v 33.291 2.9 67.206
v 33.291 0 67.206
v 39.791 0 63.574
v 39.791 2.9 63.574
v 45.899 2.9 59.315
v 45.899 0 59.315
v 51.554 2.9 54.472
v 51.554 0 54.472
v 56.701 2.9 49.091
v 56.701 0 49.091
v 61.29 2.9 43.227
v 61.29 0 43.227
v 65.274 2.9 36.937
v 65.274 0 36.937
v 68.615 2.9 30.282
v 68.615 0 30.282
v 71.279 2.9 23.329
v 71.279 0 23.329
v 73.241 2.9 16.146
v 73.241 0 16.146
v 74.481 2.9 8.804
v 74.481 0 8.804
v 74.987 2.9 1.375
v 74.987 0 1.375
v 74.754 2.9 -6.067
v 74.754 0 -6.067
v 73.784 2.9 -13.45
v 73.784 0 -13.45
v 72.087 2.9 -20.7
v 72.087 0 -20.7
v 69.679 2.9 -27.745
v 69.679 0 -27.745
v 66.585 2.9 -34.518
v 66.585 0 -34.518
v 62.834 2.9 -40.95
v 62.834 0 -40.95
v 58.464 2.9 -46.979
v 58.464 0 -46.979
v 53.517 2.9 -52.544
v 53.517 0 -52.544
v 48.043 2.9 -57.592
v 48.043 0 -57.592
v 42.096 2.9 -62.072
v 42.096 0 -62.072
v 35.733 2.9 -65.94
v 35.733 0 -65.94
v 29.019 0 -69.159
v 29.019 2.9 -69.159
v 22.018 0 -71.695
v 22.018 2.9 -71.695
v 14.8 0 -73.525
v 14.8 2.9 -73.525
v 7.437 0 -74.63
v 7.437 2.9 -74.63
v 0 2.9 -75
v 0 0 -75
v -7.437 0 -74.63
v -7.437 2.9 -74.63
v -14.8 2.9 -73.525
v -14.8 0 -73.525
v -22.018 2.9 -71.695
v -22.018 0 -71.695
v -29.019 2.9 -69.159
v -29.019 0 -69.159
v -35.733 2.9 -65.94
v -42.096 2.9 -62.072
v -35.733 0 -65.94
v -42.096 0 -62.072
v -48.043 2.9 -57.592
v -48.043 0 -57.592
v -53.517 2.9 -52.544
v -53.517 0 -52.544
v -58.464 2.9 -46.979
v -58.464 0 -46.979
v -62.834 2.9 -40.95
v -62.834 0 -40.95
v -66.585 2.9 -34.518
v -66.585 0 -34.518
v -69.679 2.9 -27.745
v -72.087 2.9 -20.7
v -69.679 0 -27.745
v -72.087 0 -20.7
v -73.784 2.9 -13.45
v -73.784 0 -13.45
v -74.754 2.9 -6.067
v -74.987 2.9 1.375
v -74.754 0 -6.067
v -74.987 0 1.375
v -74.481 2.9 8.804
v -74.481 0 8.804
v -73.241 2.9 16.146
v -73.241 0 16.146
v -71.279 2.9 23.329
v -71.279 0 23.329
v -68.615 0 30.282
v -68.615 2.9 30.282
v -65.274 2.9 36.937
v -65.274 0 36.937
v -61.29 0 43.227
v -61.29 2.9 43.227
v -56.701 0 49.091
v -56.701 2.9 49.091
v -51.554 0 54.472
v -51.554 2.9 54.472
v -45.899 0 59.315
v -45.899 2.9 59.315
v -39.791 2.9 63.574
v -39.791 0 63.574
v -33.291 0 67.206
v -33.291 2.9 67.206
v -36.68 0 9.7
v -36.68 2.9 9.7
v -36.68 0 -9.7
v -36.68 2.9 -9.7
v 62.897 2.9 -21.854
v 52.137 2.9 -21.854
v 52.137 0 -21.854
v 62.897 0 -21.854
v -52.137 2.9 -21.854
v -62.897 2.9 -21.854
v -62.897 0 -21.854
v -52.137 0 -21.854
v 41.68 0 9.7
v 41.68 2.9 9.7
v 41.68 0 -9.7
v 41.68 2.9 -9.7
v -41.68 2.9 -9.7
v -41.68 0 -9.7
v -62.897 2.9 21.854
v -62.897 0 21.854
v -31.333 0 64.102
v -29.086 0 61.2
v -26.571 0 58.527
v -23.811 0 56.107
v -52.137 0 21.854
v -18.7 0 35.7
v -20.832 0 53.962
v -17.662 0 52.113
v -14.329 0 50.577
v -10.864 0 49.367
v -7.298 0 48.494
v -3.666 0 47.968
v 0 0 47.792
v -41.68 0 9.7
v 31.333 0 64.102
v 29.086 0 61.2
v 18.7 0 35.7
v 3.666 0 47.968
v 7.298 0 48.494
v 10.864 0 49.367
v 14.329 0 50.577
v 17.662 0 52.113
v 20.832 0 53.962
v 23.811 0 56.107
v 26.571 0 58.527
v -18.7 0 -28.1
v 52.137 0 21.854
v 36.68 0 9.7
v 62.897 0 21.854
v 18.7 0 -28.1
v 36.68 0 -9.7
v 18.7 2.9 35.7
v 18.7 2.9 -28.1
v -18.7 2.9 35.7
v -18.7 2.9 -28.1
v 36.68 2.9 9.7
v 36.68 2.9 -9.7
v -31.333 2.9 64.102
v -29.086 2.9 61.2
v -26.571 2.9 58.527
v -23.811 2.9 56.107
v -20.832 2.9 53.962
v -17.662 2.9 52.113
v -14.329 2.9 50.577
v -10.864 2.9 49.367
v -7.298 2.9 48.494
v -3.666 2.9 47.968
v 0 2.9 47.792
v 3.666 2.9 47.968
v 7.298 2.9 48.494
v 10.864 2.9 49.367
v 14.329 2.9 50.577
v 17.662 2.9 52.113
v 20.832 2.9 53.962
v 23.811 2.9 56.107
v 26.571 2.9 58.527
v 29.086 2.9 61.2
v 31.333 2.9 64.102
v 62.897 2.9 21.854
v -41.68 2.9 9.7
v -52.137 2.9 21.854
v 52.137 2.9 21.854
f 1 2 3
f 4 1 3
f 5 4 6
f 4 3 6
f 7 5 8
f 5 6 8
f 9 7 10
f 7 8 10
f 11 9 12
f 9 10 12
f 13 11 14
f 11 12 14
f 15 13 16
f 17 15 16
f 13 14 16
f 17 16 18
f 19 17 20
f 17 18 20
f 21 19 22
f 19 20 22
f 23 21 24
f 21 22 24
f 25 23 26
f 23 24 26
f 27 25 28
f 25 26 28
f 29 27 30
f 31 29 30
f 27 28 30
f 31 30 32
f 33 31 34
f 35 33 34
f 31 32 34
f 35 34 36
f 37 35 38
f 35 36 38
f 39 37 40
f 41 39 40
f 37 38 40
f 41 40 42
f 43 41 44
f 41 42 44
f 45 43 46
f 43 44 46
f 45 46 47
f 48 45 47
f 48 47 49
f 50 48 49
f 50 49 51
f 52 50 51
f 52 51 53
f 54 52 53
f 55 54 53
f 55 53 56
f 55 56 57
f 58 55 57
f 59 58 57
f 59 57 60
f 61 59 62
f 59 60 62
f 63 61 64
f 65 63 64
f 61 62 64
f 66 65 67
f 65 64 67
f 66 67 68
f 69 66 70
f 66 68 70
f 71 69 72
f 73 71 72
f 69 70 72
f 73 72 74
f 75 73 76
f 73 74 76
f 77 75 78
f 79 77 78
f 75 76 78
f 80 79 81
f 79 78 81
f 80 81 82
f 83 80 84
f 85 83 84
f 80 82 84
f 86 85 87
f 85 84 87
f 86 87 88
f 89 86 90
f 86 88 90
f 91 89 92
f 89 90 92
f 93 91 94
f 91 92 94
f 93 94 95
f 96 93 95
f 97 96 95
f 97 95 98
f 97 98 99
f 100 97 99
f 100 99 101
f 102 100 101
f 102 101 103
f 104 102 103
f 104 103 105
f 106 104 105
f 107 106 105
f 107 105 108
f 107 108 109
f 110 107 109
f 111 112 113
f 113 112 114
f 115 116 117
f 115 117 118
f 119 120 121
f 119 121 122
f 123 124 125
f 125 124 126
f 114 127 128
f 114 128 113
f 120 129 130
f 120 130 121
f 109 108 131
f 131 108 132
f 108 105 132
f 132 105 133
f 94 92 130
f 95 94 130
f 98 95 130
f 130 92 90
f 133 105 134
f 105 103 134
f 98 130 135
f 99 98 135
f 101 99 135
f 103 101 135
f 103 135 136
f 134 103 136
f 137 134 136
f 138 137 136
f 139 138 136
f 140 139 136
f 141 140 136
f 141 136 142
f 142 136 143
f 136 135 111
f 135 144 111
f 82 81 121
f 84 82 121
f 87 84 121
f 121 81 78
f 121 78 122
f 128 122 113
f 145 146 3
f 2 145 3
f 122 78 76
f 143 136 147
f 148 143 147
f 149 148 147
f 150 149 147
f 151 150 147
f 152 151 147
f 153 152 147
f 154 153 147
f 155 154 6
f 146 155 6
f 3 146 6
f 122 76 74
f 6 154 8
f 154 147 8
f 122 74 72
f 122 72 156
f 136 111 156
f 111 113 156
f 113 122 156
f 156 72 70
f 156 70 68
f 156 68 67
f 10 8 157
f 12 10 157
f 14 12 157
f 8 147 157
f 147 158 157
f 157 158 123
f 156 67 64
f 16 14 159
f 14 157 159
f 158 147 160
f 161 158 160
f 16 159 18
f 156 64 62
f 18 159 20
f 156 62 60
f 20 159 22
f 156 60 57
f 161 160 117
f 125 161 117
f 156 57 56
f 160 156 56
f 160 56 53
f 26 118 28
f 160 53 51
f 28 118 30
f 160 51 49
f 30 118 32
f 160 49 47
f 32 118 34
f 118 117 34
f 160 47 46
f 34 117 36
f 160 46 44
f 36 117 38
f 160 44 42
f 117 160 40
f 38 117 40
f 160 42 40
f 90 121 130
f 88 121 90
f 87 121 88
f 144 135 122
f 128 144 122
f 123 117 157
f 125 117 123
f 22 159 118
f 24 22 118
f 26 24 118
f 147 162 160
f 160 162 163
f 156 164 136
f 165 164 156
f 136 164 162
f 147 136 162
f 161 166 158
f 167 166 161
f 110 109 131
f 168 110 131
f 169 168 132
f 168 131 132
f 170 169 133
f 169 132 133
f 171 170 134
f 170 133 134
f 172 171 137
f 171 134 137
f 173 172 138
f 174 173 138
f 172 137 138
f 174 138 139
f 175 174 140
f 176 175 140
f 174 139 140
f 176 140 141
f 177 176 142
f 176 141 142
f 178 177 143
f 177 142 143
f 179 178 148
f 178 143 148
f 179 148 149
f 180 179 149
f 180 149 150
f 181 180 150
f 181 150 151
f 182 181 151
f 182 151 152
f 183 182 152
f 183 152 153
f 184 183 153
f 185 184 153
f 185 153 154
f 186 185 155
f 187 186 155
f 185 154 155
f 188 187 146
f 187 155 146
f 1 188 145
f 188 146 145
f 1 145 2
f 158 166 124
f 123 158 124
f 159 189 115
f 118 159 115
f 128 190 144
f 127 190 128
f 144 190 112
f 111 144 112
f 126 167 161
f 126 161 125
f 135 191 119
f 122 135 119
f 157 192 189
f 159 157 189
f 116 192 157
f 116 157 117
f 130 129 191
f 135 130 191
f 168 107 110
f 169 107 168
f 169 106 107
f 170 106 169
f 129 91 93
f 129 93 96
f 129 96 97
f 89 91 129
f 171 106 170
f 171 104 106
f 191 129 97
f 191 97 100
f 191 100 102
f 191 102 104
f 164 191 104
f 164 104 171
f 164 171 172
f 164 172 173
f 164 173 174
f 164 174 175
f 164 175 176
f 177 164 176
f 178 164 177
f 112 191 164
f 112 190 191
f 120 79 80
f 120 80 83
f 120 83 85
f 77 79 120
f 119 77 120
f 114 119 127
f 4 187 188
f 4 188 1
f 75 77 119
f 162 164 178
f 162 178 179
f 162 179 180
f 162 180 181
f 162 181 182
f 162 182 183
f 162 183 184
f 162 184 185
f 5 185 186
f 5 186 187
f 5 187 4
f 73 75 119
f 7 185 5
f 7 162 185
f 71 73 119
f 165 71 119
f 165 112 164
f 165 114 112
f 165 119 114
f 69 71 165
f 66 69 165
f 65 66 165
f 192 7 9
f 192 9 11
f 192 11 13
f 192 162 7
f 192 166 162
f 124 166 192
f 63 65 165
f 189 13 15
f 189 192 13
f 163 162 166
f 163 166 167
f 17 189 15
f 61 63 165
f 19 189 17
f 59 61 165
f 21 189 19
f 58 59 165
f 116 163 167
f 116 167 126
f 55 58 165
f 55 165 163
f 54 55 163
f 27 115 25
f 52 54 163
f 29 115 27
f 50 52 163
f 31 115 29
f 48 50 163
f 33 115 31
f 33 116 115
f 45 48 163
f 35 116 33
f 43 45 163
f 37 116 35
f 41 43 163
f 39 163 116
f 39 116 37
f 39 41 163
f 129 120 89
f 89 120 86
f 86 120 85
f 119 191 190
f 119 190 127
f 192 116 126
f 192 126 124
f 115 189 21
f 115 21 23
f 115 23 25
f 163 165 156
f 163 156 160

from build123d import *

# Parameters (mm, degrees)
BOSS_EXTRUDE1_DEPTH  = 2.9
SOLENOID_PLACEMENT_W = 37.4
SOLENOID_PLACEMENT_H = 63.8
CUT_EXTRUDE1_DEPTH   = 107.105654892
SKETCH2_W            = 10.76
SKETCH2_H            = 43.707605188
CUT_EXTRUDE2_DEPTH   = 107.105654892
SKETCH3_W            = 5
SKETCH3_H            = 19.4
CUT_EXTRUDE3_DEPTH   = 107.105654892


with BuildPart() as part:
    # Sketch1 → Boss-Extrude1 (new body)
    with BuildSketch(Plane(origin=(0, 0, 0), x_dir=(1, 0, 0), z_dir=(0, 1, 0))):
        with BuildLine():
            ThreePointArc((33.29110537, -67.206415641), (0, 75), (-33.29110537, -67.206415641))
            ThreePointArc((-33.29110537, -67.206415641), (0, -47.791616815), (33.29110537, -67.206415641))
        make_face()
    extrude(amount=BOSS_EXTRUDE1_DEPTH)

    # solenoid placement → Cut-Extrude1 (cut, through all)
    with BuildSketch(Plane(origin=(0, 2.9, 0), x_dir=(1, 0, 0), z_dir=(0, 1, 0))):
        with Locations((0, -3.8)):
            Rectangle(SOLENOID_PLACEMENT_W, SOLENOID_PLACEMENT_H)
    extrude(amount=-CUT_EXTRUDE1_DEPTH, mode=Mode.SUBTRACT)

    # Sketch2 → Cut-Extrude2 (cut, through all)
    with BuildSketch(Plane(origin=(0, 2.9, 0), x_dir=(1, 0, 0), z_dir=(0, 1, 0))):
        with Locations((57.517491988, 0)):
            Rectangle(SKETCH2_W, SKETCH2_H)
        with Locations((-57.517491988, 0)):
            Rectangle(SKETCH2_W, SKETCH2_H)
    extrude(amount=-CUT_EXTRUDE2_DEPTH, mode=Mode.SUBTRACT)

    # Sketch3 → Cut-Extrude3 (cut, through all)
    with BuildSketch(Plane(origin=(0, 2.9, 0), x_dir=(1, 0, 0), z_dir=(0, 1, 0))):
        with Locations((-39.179852803, 0)):
            Rectangle(SKETCH3_W, SKETCH3_H)
        with Locations((39.179852803, 0)):
            Rectangle(SKETCH3_W, SKETCH3_H)
    extrude(amount=-CUT_EXTRUDE3_DEPTH, mode=Mode.SUBTRACT)


solid = part.part
